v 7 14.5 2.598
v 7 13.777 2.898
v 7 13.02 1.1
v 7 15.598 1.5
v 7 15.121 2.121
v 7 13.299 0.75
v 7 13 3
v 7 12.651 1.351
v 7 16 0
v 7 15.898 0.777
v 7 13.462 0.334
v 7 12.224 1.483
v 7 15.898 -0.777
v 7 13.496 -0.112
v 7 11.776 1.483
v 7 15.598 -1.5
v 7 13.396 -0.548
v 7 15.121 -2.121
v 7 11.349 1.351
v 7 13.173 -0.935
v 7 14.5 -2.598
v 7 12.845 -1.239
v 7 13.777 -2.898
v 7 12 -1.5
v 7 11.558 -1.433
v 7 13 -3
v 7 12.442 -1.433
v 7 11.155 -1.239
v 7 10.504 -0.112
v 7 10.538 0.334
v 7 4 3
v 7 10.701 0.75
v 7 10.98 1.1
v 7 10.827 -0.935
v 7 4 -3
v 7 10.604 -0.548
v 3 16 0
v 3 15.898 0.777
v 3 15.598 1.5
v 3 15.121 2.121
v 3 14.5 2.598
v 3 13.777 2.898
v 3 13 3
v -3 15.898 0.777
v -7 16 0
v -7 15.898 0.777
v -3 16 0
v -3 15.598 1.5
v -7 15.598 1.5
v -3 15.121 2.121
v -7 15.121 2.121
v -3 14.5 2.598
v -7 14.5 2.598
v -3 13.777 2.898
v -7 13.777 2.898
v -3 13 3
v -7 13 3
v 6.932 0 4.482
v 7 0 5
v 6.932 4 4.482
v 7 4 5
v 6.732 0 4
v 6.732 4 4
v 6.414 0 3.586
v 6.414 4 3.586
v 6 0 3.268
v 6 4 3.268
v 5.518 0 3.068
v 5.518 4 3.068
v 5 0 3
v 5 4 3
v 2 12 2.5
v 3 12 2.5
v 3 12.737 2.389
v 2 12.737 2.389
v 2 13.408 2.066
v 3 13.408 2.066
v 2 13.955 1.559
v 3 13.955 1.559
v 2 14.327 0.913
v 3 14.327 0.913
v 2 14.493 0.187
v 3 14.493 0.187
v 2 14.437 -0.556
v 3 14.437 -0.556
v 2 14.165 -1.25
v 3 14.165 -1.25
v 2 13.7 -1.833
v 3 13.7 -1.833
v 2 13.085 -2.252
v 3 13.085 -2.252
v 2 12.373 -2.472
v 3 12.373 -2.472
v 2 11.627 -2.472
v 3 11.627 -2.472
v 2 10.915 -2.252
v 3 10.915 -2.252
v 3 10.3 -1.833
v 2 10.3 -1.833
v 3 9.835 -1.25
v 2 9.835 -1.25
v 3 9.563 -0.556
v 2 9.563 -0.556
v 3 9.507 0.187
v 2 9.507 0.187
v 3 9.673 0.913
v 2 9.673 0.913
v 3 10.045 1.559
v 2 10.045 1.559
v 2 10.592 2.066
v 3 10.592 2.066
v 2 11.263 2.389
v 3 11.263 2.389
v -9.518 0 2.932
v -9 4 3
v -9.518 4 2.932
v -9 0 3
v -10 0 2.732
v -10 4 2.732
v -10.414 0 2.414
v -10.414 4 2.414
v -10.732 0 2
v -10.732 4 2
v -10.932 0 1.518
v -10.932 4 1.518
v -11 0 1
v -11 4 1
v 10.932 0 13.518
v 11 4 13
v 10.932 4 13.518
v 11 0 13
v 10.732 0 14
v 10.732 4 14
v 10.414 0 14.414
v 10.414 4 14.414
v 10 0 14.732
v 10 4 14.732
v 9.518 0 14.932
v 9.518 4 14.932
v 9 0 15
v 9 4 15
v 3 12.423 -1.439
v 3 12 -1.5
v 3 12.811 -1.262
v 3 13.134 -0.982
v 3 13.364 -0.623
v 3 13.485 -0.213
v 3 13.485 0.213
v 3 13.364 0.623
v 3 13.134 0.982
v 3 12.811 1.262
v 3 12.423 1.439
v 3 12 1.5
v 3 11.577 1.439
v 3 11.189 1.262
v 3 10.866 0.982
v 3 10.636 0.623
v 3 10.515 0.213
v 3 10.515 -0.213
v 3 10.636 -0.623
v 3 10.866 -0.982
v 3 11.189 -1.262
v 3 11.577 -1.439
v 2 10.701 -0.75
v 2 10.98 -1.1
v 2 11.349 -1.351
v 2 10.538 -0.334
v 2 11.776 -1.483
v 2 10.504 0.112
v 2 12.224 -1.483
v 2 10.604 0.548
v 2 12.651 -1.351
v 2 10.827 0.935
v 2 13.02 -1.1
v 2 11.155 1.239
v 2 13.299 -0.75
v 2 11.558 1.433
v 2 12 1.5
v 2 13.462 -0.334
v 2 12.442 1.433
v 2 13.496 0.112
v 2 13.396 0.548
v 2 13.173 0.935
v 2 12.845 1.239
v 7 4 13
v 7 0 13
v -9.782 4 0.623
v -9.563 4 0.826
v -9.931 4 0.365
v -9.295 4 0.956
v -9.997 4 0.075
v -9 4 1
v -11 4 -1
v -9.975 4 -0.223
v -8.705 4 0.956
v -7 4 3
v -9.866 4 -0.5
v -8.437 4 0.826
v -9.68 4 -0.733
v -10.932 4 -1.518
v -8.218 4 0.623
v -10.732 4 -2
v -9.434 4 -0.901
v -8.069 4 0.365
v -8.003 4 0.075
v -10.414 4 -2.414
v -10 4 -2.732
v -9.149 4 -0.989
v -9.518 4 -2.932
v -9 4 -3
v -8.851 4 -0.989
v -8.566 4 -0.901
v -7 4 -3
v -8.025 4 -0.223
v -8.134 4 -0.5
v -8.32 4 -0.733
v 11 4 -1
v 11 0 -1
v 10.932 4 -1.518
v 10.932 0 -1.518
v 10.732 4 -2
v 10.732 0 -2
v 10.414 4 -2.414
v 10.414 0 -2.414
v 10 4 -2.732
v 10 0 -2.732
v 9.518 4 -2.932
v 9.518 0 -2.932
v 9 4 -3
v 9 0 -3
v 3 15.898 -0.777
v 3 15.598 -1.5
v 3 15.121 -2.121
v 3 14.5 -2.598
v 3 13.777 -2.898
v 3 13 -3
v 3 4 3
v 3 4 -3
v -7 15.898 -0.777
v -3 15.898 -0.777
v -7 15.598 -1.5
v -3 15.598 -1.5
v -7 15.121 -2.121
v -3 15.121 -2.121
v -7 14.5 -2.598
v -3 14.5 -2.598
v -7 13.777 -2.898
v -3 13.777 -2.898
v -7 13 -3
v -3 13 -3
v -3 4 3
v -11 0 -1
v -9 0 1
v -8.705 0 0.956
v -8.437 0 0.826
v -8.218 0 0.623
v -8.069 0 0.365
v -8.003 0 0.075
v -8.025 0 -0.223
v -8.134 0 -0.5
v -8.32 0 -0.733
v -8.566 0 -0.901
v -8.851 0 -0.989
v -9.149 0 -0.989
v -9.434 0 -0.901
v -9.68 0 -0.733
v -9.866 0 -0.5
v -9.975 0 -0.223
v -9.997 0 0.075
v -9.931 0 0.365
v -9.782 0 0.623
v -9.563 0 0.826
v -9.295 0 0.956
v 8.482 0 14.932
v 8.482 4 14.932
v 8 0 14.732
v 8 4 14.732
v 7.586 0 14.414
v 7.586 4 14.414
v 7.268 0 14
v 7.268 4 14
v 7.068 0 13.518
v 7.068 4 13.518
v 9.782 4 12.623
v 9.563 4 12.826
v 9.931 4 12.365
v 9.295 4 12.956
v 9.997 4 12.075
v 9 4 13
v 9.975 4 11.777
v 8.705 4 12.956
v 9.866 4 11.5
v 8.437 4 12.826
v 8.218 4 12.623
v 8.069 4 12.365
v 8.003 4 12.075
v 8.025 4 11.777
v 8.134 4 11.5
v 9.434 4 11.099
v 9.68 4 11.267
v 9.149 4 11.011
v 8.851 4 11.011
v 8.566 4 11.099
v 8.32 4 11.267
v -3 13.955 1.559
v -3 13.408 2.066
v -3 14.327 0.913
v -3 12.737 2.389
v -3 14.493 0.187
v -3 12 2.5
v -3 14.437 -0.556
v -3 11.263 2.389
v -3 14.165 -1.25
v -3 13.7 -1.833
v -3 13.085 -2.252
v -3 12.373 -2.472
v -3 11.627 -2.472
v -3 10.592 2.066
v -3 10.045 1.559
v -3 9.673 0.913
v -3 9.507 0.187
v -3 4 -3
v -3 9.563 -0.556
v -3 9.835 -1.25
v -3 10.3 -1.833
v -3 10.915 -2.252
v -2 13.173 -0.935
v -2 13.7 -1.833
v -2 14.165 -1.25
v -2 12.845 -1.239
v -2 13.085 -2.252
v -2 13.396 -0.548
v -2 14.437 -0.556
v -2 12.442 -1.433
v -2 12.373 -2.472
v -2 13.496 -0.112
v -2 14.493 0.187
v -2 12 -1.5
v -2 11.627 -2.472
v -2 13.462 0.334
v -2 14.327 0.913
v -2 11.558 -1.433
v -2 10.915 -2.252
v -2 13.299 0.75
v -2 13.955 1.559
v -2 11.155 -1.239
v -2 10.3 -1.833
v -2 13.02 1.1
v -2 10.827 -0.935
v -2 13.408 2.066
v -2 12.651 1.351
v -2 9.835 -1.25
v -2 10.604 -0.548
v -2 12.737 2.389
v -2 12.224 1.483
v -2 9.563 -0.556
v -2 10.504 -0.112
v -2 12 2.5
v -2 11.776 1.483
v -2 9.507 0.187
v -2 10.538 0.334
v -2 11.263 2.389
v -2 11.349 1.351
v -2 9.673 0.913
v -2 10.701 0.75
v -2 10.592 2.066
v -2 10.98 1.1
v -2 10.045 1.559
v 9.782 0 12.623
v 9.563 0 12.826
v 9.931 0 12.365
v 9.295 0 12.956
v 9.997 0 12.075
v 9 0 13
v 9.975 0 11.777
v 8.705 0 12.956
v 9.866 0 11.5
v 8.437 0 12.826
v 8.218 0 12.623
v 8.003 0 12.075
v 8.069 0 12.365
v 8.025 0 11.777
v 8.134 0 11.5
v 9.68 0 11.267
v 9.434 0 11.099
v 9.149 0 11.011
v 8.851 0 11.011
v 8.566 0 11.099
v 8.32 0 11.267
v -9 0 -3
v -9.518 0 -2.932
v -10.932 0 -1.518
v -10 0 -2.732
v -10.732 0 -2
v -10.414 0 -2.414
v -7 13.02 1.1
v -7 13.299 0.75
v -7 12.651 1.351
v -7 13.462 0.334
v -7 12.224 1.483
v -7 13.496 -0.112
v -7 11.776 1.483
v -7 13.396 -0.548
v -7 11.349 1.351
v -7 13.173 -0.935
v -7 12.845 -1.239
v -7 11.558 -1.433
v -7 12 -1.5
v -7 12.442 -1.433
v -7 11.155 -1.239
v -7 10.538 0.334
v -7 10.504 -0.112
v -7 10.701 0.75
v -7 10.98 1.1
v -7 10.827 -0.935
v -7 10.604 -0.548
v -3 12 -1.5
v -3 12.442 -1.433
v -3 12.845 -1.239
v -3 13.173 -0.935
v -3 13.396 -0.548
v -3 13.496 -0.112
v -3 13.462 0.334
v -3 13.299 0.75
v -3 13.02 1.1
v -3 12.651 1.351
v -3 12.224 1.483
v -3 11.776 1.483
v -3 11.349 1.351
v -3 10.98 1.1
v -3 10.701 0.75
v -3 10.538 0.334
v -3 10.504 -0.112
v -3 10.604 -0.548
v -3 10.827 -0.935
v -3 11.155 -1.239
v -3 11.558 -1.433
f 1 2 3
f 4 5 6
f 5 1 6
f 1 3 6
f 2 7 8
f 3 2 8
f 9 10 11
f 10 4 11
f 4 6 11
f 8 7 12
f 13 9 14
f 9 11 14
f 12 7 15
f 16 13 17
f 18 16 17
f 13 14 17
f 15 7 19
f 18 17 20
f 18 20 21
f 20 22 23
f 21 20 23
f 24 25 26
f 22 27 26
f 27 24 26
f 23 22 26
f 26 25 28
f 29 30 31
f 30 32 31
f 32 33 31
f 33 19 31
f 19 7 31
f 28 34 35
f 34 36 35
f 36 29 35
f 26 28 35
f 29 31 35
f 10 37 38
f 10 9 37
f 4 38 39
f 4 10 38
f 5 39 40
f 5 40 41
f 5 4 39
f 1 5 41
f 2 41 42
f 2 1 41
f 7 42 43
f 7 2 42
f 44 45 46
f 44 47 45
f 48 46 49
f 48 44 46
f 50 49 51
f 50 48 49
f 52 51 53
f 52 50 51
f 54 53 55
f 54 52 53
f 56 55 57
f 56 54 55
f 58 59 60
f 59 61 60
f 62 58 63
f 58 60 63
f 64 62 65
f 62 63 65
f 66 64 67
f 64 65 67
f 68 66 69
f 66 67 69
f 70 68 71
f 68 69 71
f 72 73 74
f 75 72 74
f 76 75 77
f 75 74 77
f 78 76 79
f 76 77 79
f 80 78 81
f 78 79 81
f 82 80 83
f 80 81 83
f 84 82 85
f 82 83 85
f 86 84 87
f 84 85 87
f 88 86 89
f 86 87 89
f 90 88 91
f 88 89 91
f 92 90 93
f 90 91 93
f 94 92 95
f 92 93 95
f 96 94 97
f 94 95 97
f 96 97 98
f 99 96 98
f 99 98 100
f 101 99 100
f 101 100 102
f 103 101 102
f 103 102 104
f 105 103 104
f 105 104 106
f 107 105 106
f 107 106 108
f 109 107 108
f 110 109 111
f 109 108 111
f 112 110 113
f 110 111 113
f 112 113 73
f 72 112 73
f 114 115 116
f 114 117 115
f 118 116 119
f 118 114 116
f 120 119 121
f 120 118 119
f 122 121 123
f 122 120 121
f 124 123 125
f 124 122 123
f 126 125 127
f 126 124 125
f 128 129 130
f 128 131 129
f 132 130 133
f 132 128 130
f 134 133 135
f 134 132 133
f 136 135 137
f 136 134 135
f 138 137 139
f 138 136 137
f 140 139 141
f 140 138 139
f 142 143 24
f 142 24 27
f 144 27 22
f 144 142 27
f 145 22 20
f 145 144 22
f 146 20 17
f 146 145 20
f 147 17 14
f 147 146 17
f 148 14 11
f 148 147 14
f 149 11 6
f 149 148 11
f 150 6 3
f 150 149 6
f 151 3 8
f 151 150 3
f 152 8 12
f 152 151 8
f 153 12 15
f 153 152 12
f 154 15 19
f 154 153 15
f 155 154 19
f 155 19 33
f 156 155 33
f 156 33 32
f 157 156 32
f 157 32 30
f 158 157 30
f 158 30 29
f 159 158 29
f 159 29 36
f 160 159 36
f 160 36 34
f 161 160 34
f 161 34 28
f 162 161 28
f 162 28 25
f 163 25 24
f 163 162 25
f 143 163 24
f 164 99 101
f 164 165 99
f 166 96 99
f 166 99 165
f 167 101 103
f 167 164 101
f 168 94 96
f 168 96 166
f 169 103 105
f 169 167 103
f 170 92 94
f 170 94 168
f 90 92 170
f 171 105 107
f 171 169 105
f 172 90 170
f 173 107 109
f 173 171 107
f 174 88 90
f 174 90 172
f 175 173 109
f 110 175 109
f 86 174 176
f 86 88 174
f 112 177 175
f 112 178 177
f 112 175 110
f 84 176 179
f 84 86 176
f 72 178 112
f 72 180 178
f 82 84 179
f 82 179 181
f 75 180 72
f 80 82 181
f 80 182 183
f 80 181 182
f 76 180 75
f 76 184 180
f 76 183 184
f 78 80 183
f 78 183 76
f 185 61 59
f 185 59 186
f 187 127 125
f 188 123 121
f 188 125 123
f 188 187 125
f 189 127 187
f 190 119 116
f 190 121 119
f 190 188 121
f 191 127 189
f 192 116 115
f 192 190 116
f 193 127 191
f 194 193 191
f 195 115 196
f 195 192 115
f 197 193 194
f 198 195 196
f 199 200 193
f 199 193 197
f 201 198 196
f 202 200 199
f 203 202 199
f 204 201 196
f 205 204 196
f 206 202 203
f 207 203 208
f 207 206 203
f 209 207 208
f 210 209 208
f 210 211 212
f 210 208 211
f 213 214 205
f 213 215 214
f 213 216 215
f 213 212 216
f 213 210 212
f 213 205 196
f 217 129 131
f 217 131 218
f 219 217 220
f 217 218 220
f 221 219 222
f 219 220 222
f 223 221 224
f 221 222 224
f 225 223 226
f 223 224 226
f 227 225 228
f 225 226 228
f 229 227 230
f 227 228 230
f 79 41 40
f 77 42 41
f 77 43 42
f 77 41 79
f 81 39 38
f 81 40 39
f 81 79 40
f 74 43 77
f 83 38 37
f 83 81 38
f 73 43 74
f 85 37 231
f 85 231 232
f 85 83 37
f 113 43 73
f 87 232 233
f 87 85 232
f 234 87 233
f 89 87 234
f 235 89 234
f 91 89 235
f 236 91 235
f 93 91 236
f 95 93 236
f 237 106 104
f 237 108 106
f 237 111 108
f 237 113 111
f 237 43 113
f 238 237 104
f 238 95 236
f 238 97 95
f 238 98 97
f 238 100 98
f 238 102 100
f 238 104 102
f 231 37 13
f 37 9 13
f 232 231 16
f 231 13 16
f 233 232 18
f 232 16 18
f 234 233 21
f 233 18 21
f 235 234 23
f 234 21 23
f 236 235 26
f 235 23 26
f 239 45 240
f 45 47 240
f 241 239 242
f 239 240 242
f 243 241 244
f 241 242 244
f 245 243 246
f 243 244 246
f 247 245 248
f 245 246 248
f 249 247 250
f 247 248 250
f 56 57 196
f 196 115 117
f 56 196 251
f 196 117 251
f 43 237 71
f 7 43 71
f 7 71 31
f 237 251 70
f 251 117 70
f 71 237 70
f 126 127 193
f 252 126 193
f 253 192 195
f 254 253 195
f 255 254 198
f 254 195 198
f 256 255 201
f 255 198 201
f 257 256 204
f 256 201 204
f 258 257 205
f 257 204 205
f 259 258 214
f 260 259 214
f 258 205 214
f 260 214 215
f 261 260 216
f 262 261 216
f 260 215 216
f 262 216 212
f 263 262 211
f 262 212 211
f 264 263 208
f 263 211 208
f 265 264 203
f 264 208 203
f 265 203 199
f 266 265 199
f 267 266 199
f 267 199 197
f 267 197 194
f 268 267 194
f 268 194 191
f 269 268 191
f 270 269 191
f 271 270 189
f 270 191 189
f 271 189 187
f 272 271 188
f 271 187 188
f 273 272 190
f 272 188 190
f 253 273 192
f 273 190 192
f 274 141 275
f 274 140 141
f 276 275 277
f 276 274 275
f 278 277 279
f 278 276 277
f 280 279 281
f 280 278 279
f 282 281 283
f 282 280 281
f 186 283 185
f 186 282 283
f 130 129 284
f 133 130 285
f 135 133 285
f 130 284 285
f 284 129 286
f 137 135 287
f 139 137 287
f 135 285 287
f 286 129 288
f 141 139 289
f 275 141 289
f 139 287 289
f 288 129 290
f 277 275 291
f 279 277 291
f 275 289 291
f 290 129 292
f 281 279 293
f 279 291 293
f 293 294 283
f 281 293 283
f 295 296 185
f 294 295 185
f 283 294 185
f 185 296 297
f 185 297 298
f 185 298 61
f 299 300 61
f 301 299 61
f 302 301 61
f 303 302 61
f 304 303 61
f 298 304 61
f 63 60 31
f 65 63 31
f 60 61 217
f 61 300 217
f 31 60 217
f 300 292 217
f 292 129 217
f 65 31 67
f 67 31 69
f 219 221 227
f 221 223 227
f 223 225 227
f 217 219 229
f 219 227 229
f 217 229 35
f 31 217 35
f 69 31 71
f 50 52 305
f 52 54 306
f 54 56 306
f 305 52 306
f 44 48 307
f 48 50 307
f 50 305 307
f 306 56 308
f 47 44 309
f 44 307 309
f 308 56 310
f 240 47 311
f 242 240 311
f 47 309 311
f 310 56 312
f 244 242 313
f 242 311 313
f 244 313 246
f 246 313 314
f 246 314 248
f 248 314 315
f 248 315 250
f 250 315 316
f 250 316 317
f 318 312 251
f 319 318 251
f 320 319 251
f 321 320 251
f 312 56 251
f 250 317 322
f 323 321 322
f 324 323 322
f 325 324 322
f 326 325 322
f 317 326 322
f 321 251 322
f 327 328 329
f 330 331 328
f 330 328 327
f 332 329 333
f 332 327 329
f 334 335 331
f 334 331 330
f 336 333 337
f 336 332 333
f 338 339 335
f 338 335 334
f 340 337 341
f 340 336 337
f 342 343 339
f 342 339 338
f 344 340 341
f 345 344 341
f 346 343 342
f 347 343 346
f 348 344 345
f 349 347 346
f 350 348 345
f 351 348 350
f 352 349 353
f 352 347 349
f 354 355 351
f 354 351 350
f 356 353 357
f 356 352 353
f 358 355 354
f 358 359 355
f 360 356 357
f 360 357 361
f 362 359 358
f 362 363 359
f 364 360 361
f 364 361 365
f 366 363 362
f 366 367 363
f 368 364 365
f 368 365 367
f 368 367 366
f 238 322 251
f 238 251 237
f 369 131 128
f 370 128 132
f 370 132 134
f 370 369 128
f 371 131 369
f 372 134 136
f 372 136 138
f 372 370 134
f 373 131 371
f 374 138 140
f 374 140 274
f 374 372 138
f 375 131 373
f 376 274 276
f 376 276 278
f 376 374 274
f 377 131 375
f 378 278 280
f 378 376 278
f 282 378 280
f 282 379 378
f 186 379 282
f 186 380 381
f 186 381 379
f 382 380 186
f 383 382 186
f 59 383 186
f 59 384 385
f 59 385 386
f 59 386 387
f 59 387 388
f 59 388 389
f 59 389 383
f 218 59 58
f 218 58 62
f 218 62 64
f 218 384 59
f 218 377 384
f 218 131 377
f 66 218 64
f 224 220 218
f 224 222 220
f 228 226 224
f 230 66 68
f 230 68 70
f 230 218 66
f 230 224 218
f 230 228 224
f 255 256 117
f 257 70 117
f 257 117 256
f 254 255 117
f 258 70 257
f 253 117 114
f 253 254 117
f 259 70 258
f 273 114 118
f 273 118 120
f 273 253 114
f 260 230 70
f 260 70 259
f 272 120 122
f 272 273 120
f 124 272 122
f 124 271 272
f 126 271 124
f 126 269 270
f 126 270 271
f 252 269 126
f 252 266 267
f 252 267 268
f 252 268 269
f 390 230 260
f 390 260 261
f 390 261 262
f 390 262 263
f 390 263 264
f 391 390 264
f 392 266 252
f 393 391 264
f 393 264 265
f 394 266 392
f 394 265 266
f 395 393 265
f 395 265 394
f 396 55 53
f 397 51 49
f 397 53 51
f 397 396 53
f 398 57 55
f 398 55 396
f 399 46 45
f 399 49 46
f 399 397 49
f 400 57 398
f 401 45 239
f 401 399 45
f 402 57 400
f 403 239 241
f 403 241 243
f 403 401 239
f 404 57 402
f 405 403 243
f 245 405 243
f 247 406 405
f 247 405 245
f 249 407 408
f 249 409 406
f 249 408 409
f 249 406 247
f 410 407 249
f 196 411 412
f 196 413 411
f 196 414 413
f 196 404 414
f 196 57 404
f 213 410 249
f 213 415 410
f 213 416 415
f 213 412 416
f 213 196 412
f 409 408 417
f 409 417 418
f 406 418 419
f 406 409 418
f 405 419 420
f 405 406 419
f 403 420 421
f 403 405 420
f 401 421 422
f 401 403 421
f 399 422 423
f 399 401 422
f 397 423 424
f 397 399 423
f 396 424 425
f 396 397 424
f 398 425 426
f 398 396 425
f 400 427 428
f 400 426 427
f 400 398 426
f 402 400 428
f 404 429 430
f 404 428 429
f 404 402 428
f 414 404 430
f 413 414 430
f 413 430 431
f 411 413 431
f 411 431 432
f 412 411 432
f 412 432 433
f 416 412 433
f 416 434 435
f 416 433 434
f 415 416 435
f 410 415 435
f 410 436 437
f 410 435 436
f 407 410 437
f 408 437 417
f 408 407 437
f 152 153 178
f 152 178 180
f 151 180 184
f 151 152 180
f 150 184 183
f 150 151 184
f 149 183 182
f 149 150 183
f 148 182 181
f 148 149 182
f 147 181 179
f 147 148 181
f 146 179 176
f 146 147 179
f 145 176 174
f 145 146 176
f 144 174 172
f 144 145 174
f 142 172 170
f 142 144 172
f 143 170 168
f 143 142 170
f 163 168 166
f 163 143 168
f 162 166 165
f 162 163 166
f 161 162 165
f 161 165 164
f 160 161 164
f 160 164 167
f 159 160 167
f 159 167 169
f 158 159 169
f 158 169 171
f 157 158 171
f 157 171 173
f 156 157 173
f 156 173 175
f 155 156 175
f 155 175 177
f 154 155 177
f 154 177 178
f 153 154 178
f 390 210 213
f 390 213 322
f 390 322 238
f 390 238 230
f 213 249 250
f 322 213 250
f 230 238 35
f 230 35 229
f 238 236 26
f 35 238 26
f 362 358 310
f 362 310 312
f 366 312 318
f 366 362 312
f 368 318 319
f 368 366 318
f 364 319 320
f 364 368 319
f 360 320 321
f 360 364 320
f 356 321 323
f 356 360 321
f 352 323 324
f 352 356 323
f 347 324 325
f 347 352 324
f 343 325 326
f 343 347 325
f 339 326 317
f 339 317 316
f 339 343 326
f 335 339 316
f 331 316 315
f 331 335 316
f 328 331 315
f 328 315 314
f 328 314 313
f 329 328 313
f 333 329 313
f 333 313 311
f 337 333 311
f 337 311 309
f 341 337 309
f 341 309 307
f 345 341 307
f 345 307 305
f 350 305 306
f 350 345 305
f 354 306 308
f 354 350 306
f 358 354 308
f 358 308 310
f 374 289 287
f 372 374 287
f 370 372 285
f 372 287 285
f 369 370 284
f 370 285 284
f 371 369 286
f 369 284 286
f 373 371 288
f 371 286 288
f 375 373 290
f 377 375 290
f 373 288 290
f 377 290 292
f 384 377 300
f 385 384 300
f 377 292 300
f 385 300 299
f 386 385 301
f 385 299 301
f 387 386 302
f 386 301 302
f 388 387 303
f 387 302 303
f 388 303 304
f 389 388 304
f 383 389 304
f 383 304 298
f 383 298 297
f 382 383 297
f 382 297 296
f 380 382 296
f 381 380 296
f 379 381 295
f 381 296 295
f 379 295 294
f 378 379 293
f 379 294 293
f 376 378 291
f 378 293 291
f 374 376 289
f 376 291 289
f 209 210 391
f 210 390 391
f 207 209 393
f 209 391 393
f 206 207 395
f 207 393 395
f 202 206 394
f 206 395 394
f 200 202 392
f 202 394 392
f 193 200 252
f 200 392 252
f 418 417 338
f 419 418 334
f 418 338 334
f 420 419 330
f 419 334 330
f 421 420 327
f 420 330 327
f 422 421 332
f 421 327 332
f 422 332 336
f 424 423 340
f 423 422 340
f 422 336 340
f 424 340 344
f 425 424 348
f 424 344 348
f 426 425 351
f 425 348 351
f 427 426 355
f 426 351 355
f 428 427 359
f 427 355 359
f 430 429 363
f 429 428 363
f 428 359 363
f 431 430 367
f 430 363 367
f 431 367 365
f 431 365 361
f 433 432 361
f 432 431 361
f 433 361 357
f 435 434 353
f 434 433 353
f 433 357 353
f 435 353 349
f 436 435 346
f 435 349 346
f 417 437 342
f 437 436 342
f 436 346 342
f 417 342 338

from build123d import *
from build123d.topology import SkipClean

# Parameters (mm, degrees)
SKETCH2_W               = 14
SKETCH2_H               = 6
BOSS_EXTRUDE1_DEPTH     = 4
SKETCH3_W               = 4
SKETCH3_H               = 6
BOSS_EXTRUDE2_DEPTH     = 12
CUT_EXTRUDE1_DEPTH      = 22.470910554
CUT_EXTRUDE1_DEPTH_BACK = 22.470910554
SKETCH4_R               = 1.5
BOSS_EXTRUDE3_START     = 1
SKETCH5_R               = 2.5
SKETCH5_R_2             = 1.5
BOSS_EXTRUDE3_DEPTH     = 1
SKETCH6_R               = 2.5
SKETCH6_R_2             = 1.5
BOSS_EXTRUDE4_DEPTH     = 1
SKETCH7_R               = 1
SKETCH7_W               = 4
SKETCH7_H               = 6
BOSS_EXTRUDE5_DEPTH     = 4
FILLET1_R               = 2
FILLET2_R               = 3


with BuildPart() as part:
    # Sketch2 → Boss-Extrude1 (new body)
    with BuildSketch(Plane(origin=(0, 0, 0), x_dir=(1, 0, 0), z_dir=(0, 1, 0))):
        Rectangle(SKETCH2_W, SKETCH2_H)
    extrude(amount=BOSS_EXTRUDE1_DEPTH)

    # Sketch3 → Boss-Extrude2 (add)
    with BuildSketch(Plane(origin=(0, 4, 0), x_dir=(1, 0, 0), z_dir=(0, 1, 0))):
        with Locations((-5, 0)):
            Rectangle(SKETCH3_W, SKETCH3_H)
        with Locations((5, 0)):
            Rectangle(SKETCH3_W, SKETCH3_H)
    extrude(amount=BOSS_EXTRUDE2_DEPTH)

    # Sketch4 → Cut-Extrude1 (cut, two sides: drawn at the far end of the back side and taken through both)
    with BuildSketch(Plane(origin=(7, 0, 0), x_dir=(0, 0, -1), z_dir=(1, 0, 0)).offset(-CUT_EXTRUDE1_DEPTH_BACK)):
        with Locations((0, 12)):
            Circle(SKETCH4_R)
    extrude(amount=CUT_EXTRUDE1_DEPTH + CUT_EXTRUDE1_DEPTH_BACK, mode=Mode.SUBTRACT)

    # Sketch5 → Boss-Extrude3 (add)
    with BuildSketch(Plane(origin=(-3, 0, 0), x_dir=(0, 0, -1), z_dir=(1, 0, 0)).offset(BOSS_EXTRUDE3_START)):
        with Locations(Location((0, 12, 0), (0, 0, 180))):
            Circle(SKETCH5_R)
        with Locations((0, 12)):
            Circle(SKETCH5_R_2, mode=Mode.SUBTRACT)
    extrude(amount=-BOSS_EXTRUDE3_DEPTH)

    # Sketch6 → Boss-Extrude4 (add)
    with SkipClean():  # the faces are left unmerged after this step: merging them gives an invalid solid
        with BuildSketch(Plane.ZY.offset(-3)):
            with Locations((0, 12)):
                Circle(SKETCH6_R)
            with Locations((0, 12)):
                Circle(SKETCH6_R_2, mode=Mode.SUBTRACT)
        extrude(amount=BOSS_EXTRUDE4_DEPTH)

    # Sketch7 → Boss-Extrude5 (add)
    # profile 1 of 2: a face of its own
    with SkipClean():  # the faces are left unmerged after this step: merging them gives an invalid solid
        with BuildSketch(Plane(origin=(0, 4, 0), x_dir=(1, 0, 0), z_dir=(0, 1, 0))):
            Polygon((11, 3), (11, -3), (11, -11), (11, -15), (7, -15), (7, -11), (7, -3), (7, 3), align=None)
            with Locations(Location((9, -12, 0), (0, 0, 270))):
                Circle(SKETCH7_R, mode=Mode.SUBTRACT)
        # profile 2 of 2: a face of its own
        with BuildSketch(Plane(origin=(0, 4, 0), x_dir=(1, 0, 0), z_dir=(0, 1, 0))):
            with Locations((-9, 0)):
                Rectangle(SKETCH7_W, SKETCH7_H)
            with Locations(Location((-9, 0, 0), (0, 0, 270))):
                Circle(SKETCH7_R, mode=Mode.SUBTRACT)
        extrude(amount=-BOSS_EXTRUDE5_DEPTH)

    # Fillet1
    fillet1_edges = [part.edges().sort_by_distance(p)[0] for p in [
        (-11, 2, -3),
        (11, 2, -3),
        (-11, 2, 3),
        (7, 2, 3),
        (11, 2, 15),
        (7, 2, 15),
    ]]
    fillet(fillet1_edges, radius=FILLET1_R - 0.0001)  # a hair under: the kernel refuses the full size

    # Fillet2
    fillet2_edges = [part.edges().sort_by_distance(p)[0] for p in [
        (-5, 16, -3),
        (5, 16, -3),
        (5, 16, 3),
        (-5, 16, 3),
    ]]
    fillet(fillet2_edges, radius=FILLET2_R - 0.0001)  # a hair under: the kernel refuses the full size


solid = part.part
